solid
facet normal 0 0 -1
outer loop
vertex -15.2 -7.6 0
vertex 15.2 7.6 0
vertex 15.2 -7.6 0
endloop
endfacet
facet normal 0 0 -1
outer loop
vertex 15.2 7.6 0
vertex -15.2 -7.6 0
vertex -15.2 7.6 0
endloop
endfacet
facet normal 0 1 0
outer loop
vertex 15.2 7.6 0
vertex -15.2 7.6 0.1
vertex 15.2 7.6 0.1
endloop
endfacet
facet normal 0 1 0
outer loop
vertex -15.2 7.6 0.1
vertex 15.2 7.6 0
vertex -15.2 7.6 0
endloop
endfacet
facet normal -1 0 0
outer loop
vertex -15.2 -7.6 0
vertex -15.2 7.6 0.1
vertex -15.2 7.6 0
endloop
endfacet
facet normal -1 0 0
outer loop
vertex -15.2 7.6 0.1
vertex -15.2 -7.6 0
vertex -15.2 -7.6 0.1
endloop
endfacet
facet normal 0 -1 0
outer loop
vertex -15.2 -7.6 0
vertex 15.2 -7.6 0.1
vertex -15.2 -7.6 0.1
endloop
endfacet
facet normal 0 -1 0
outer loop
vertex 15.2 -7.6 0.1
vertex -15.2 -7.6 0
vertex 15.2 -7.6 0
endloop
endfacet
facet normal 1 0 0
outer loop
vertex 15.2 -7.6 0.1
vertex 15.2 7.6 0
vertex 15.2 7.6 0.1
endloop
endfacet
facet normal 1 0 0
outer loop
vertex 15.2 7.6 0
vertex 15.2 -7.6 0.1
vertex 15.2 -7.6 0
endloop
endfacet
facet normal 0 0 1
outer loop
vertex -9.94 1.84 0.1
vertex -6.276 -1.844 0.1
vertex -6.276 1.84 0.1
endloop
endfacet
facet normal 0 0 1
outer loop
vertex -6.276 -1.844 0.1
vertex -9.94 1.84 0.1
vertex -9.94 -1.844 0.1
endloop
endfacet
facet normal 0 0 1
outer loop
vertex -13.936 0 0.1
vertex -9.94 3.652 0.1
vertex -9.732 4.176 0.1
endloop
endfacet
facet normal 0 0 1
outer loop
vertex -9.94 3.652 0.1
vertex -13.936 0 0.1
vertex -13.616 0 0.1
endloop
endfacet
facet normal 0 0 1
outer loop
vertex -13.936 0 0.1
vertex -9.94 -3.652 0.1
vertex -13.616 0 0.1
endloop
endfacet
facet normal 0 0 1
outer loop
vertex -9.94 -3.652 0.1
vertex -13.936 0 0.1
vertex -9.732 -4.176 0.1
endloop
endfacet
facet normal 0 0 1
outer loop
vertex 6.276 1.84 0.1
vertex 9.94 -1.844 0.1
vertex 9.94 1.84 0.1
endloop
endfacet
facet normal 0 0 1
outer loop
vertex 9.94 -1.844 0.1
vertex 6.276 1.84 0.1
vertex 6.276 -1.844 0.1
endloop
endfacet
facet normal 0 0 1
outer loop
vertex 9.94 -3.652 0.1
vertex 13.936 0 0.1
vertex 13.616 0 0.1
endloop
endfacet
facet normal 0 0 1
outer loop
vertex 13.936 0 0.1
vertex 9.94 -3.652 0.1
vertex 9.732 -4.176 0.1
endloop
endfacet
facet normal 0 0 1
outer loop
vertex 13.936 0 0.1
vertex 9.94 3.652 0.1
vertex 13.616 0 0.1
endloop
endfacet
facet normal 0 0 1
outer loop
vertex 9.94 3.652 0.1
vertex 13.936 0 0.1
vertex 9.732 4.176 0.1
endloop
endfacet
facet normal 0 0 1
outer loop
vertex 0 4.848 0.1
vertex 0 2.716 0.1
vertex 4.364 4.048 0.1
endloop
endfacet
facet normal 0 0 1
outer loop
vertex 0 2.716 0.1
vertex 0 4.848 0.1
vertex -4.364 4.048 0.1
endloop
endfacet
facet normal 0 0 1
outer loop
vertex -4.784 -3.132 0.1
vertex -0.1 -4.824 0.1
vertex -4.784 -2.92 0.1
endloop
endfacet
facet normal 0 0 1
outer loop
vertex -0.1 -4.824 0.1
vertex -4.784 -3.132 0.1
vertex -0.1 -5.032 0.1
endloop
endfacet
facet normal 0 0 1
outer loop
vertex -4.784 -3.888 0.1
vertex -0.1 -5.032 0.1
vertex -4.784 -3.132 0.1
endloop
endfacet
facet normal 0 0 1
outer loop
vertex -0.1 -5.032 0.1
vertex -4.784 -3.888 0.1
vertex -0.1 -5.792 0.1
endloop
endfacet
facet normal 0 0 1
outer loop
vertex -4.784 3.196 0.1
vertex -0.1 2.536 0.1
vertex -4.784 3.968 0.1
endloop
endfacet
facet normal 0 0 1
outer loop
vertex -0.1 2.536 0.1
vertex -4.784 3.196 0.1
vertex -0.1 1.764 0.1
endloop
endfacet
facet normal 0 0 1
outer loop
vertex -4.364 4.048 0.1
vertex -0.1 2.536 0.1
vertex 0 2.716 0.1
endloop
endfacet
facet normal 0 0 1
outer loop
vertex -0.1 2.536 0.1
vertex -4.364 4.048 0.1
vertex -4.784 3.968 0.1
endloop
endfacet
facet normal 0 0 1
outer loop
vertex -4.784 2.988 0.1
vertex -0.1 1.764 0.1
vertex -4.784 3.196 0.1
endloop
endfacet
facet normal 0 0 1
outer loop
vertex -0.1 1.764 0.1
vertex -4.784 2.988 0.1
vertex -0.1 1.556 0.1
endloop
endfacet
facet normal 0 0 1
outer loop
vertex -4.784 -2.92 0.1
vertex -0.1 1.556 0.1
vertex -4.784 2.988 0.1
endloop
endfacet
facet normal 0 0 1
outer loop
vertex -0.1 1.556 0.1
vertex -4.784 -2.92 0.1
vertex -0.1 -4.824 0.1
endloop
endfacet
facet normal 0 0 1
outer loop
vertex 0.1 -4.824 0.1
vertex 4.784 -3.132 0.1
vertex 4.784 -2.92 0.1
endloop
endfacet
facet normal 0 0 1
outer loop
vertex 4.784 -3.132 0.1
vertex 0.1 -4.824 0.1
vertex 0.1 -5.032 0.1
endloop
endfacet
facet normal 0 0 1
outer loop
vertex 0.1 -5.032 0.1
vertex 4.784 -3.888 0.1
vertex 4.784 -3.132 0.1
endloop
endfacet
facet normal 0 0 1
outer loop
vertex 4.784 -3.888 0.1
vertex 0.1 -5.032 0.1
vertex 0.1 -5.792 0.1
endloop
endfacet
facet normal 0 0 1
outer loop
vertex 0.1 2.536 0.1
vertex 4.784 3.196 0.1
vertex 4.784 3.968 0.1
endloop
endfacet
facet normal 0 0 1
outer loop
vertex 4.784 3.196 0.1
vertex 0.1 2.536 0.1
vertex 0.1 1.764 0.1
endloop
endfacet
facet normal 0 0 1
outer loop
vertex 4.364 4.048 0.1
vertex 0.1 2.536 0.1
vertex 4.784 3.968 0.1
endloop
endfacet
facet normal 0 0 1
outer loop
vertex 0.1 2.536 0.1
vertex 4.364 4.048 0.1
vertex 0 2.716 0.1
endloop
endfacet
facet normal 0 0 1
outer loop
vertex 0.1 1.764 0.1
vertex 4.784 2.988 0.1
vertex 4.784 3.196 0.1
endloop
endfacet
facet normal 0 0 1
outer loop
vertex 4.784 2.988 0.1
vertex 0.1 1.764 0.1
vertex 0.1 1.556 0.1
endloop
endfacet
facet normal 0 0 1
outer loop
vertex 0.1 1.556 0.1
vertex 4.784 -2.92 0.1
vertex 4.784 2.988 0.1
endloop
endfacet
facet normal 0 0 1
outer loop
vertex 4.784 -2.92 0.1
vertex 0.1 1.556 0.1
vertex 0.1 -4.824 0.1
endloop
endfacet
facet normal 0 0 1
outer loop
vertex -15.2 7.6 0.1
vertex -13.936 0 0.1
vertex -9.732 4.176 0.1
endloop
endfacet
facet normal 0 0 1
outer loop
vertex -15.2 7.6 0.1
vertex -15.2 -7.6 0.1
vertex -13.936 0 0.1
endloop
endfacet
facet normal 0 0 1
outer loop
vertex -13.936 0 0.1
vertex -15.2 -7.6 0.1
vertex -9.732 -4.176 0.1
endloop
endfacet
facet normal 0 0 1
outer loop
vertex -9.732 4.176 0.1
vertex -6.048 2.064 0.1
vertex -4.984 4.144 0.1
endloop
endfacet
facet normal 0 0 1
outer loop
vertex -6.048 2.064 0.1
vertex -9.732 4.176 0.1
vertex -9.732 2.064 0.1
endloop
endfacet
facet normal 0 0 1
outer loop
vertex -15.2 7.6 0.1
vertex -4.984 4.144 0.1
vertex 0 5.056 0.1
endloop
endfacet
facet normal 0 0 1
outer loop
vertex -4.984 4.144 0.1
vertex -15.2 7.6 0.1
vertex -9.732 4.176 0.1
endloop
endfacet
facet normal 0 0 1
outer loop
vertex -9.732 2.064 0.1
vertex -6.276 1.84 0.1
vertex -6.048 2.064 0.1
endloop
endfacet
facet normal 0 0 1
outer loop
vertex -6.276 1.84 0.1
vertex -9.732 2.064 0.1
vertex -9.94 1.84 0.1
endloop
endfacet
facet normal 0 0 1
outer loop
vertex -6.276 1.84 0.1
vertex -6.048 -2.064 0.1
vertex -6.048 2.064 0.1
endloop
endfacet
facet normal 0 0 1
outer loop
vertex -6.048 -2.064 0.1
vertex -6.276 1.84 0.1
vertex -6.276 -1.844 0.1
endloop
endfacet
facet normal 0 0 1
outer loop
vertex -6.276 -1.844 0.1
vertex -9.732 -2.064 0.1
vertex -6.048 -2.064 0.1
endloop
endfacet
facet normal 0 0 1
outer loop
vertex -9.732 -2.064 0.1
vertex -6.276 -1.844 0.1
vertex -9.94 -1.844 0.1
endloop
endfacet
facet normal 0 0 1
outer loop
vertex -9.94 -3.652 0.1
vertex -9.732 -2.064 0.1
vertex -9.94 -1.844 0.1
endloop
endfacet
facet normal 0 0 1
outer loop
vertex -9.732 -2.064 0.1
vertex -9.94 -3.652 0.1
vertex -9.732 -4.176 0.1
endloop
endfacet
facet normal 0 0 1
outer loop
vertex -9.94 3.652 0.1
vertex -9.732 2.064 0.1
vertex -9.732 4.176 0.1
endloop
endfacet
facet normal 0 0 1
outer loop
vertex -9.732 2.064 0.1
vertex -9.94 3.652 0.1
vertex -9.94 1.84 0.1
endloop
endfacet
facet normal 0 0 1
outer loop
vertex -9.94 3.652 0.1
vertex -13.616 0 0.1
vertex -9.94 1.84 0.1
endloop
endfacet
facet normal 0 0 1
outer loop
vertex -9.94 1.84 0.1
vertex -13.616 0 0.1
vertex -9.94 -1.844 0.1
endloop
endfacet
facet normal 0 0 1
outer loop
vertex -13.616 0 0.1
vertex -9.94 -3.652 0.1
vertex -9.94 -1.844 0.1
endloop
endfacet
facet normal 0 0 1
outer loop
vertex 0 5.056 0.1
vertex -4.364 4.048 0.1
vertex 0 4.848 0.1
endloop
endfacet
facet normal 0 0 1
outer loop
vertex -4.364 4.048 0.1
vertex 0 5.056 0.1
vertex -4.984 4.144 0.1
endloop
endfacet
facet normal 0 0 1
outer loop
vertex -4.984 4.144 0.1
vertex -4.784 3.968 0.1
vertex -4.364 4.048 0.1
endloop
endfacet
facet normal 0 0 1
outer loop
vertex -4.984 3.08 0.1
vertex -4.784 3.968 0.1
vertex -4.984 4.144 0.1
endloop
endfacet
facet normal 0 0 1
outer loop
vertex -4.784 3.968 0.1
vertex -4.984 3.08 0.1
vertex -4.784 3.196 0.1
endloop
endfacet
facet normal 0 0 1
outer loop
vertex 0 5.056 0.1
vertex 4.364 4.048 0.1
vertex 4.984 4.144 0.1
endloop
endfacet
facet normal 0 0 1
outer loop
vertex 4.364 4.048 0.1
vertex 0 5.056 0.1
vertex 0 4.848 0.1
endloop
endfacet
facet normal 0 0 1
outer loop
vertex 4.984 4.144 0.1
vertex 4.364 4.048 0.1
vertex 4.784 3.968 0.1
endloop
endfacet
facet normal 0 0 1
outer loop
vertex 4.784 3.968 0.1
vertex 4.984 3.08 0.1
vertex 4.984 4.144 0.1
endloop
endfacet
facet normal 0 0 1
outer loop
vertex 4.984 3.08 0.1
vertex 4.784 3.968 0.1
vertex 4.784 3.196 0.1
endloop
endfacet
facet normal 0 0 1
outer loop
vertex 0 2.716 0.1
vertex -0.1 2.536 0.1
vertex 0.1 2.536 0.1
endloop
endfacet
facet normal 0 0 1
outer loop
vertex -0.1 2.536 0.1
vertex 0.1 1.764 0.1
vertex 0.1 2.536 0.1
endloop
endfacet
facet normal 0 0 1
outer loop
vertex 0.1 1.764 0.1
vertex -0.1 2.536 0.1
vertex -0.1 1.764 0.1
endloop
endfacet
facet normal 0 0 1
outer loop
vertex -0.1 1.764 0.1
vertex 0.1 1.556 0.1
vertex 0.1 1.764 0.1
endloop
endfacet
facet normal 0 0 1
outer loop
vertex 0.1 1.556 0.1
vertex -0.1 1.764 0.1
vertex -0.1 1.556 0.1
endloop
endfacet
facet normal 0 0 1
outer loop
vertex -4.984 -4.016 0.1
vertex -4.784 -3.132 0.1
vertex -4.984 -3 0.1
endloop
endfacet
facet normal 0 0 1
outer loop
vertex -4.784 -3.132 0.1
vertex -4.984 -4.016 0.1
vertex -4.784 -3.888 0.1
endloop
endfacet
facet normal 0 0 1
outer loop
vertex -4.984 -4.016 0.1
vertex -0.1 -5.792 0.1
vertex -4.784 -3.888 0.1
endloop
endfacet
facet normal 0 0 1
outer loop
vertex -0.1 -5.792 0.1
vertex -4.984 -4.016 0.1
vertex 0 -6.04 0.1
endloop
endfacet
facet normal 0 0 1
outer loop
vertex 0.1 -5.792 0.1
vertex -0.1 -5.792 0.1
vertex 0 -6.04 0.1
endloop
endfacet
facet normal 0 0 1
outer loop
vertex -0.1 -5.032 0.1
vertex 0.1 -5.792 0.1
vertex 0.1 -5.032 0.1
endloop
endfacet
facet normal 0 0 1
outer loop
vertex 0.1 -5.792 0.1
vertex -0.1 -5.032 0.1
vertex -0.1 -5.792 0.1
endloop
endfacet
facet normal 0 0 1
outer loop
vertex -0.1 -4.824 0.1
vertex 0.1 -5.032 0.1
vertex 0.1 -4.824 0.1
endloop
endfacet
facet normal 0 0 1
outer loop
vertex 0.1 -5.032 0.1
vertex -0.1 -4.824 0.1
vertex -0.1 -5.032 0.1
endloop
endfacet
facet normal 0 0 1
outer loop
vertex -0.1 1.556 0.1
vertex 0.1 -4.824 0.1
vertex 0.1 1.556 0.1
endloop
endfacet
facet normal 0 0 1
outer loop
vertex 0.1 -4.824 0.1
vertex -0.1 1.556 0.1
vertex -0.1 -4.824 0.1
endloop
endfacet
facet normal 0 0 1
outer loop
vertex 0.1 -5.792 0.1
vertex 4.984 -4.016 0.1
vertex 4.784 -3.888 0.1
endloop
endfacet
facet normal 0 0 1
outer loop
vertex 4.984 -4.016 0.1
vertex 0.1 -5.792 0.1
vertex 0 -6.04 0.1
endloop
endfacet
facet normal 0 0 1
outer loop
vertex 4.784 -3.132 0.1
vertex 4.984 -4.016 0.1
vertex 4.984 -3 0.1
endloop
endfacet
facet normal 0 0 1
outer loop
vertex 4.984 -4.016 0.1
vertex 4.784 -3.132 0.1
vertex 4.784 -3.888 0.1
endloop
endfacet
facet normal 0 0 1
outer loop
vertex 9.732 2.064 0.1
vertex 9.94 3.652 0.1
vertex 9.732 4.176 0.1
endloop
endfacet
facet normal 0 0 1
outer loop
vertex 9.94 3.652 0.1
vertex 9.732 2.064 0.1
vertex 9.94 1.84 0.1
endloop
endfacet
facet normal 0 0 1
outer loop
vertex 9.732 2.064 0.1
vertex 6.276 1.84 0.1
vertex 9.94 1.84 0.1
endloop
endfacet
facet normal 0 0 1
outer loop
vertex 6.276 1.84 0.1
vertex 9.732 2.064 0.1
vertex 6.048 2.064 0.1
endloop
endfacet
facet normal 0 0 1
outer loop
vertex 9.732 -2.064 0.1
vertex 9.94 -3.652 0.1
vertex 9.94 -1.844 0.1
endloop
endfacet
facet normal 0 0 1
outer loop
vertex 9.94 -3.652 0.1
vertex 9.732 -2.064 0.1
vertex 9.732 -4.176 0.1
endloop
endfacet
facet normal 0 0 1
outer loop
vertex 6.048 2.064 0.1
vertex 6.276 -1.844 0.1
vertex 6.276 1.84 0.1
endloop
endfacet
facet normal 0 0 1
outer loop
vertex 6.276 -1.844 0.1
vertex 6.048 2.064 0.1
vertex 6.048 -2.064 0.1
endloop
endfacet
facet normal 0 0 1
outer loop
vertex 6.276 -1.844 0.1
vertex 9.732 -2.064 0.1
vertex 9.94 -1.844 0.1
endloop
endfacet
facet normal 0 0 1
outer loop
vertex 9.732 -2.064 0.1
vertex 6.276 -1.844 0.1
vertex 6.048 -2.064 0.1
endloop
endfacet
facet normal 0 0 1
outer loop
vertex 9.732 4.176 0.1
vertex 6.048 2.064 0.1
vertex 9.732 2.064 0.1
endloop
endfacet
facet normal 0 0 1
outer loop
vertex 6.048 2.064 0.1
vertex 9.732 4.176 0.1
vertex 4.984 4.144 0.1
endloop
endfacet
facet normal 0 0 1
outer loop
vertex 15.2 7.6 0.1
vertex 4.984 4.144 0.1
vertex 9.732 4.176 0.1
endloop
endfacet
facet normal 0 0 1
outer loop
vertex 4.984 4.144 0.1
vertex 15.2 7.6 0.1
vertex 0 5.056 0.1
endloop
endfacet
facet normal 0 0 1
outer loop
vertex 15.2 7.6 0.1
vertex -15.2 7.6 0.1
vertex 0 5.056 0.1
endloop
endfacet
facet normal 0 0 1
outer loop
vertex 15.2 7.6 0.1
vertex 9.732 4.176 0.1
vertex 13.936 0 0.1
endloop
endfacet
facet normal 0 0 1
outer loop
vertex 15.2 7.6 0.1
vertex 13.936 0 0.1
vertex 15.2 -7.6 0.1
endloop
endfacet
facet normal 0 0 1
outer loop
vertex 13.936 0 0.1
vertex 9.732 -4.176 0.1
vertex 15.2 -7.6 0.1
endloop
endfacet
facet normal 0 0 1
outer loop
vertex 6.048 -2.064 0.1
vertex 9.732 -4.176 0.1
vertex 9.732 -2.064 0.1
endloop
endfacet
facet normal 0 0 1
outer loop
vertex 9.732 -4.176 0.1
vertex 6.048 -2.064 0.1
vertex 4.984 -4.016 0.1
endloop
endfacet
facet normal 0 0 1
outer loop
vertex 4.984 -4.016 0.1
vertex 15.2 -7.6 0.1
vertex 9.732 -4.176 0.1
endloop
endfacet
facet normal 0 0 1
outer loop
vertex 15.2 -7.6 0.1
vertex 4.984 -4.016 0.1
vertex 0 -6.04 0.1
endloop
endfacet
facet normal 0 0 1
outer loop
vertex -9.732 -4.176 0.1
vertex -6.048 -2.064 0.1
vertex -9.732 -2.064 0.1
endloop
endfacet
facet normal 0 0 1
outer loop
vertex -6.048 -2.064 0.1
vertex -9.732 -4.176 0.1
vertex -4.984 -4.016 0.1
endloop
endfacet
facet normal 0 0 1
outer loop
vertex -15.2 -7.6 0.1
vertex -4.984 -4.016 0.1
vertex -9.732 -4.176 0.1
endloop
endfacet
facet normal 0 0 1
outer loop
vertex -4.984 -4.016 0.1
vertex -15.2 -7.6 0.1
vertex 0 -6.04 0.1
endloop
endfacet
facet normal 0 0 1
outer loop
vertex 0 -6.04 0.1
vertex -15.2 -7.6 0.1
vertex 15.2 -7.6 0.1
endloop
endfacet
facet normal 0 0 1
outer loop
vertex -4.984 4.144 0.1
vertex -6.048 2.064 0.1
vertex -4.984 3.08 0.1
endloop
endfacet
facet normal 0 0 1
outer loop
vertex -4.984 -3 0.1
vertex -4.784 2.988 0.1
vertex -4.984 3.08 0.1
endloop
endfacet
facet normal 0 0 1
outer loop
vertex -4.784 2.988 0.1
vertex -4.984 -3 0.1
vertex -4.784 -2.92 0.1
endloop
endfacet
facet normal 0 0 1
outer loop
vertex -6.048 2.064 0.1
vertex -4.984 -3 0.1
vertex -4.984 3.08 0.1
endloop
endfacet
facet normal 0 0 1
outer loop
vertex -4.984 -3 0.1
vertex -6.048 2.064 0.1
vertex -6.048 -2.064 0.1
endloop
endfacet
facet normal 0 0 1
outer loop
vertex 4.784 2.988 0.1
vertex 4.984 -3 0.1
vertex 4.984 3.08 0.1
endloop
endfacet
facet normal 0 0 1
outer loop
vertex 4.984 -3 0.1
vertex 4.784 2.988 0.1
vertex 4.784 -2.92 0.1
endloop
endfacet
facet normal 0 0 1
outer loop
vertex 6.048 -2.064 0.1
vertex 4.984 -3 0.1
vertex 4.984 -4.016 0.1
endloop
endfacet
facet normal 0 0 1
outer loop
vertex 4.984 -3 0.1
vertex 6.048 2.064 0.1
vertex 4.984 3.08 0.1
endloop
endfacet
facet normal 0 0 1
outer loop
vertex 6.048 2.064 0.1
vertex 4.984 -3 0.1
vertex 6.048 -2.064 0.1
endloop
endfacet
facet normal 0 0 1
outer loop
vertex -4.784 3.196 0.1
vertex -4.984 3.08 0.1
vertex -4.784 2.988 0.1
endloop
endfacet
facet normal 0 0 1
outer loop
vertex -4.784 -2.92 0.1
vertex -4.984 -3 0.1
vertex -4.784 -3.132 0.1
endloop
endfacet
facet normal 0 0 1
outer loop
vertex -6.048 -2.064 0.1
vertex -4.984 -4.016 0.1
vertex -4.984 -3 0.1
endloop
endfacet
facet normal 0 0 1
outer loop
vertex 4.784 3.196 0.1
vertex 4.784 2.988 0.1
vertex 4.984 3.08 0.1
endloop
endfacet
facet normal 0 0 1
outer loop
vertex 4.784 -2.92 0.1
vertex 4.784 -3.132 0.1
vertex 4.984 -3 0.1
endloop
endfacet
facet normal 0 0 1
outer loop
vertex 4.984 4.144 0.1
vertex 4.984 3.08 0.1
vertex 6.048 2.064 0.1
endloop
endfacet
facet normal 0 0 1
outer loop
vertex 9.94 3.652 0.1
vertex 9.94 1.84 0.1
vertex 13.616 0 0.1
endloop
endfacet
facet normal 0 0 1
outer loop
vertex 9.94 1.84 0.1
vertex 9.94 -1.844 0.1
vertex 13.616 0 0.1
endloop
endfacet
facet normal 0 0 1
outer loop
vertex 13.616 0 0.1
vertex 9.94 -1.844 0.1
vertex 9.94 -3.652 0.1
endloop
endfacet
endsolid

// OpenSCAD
// file: ../p/box5-12.scad
use <../lib.scad>
function ldraw_lib__box5_12() = [
// 0 Box with 5 Faces without Any Edges
// 0 Name: box5-12.dat
// 0 Author: Chris Dee [cwdee]
// 0 !LDRAW_ORG Primitive UPDATE 2009-02
// 0 !LICENSE Licensed under CC BY 4.0 : see CAreadme.txt
// 
// 0 BFC CERTIFY CCW
  [0,"BFC","CERTIFY"],
  [0,"BFC","CCW"],
// 
// 0 !HISTORY 2009-09-03 [PTadmin] Official Update 2009-02
// 
// 
// 4 16 1 1 1 1 1 -1 -1 1 -1 -1 1 1
  [4,16,1,1,1,1,1,-1,-1,1,-1,-1,1,1],
// 4 16 -1 0 1 1 0 1 1 1 1 -1 1 1
  [4,16,-1,0,1,1,0,1,1,1,1,-1,1,1],
// 4 16 -1 0 -1 -1 0 1 -1 1 1 -1 1 -1
  [4,16,-1,0,-1,-1,0,1,-1,1,1,-1,1,-1],
// 4 16 1 0 -1 -1 0 -1 -1 1 -1 1 1 -1
  [4,16,1,0,-1,-1,0,-1,-1,1,-1,1,1,-1],
// 4 16 1 0 1 1 0 -1 1 1 -1 1 1 1
  [4,16,1,0,1,1,0,-1,1,1,-1,1,1,1],
// 0
];
module ldraw_lib__box5_12(step=0, col=false, unit=2/5, alt=false, line=0.2, solid=!$preview)
    makepoly(ldraw_lib__box5_12(), step=step, col=col, unit=unit, alt=alt, line=line, solid=solid);
ldraw_lib__box5_12(line=0.2);
// main file
use <../lib.scad>
use <190145a.scad>
function ldraw_lib__197895d() = [
// 0 =Sticker  1.9 x  3.8 with Yellow Box and Arrows
// 0 Name: 197895d.dat
// 0 Author: Takeshi Takahashi [RainbowDolphin]
// 0 !LDRAW_ORG Part Alias UPDATE 2026-07
// 0 !LICENSE Licensed under CC BY 4.0 : see CAreadme.txt
// 
// 0 BFC CERTIFY CCW
  [0,"BFC","CERTIFY"],
  [0,"BFC","CCW"],
// 
// 0 !CATEGORY Sticker
// 0 !KEYWORDS BrickLink 4030stk01, Brickowl 138761, Cargo, Freighter
// 0 !KEYWORDS Rebrickable 197895, Set 4030
// 
// 0 !HISTORY 2026-07-30 [OrionP] Official Update 2026-07
// 
// 
// 0 // Alias of 190145a
// 1 16 0 0 0 1 0 0 0 1 0 0 0 1 190145a.dat
  [1,16,0,0,0,1,0,0,0,1,0,0,0,1, ldraw_lib__190145a()],
];
module ldraw_lib__197895d(step=0, col=false, unit=2/5, alt=false, line=0.2, solid=!$preview)
    makepoly(ldraw_lib__197895d(), step=step, col=col, unit=unit, alt=alt, line=line, solid=solid);
ldraw_lib__197895d(line=0.2);
